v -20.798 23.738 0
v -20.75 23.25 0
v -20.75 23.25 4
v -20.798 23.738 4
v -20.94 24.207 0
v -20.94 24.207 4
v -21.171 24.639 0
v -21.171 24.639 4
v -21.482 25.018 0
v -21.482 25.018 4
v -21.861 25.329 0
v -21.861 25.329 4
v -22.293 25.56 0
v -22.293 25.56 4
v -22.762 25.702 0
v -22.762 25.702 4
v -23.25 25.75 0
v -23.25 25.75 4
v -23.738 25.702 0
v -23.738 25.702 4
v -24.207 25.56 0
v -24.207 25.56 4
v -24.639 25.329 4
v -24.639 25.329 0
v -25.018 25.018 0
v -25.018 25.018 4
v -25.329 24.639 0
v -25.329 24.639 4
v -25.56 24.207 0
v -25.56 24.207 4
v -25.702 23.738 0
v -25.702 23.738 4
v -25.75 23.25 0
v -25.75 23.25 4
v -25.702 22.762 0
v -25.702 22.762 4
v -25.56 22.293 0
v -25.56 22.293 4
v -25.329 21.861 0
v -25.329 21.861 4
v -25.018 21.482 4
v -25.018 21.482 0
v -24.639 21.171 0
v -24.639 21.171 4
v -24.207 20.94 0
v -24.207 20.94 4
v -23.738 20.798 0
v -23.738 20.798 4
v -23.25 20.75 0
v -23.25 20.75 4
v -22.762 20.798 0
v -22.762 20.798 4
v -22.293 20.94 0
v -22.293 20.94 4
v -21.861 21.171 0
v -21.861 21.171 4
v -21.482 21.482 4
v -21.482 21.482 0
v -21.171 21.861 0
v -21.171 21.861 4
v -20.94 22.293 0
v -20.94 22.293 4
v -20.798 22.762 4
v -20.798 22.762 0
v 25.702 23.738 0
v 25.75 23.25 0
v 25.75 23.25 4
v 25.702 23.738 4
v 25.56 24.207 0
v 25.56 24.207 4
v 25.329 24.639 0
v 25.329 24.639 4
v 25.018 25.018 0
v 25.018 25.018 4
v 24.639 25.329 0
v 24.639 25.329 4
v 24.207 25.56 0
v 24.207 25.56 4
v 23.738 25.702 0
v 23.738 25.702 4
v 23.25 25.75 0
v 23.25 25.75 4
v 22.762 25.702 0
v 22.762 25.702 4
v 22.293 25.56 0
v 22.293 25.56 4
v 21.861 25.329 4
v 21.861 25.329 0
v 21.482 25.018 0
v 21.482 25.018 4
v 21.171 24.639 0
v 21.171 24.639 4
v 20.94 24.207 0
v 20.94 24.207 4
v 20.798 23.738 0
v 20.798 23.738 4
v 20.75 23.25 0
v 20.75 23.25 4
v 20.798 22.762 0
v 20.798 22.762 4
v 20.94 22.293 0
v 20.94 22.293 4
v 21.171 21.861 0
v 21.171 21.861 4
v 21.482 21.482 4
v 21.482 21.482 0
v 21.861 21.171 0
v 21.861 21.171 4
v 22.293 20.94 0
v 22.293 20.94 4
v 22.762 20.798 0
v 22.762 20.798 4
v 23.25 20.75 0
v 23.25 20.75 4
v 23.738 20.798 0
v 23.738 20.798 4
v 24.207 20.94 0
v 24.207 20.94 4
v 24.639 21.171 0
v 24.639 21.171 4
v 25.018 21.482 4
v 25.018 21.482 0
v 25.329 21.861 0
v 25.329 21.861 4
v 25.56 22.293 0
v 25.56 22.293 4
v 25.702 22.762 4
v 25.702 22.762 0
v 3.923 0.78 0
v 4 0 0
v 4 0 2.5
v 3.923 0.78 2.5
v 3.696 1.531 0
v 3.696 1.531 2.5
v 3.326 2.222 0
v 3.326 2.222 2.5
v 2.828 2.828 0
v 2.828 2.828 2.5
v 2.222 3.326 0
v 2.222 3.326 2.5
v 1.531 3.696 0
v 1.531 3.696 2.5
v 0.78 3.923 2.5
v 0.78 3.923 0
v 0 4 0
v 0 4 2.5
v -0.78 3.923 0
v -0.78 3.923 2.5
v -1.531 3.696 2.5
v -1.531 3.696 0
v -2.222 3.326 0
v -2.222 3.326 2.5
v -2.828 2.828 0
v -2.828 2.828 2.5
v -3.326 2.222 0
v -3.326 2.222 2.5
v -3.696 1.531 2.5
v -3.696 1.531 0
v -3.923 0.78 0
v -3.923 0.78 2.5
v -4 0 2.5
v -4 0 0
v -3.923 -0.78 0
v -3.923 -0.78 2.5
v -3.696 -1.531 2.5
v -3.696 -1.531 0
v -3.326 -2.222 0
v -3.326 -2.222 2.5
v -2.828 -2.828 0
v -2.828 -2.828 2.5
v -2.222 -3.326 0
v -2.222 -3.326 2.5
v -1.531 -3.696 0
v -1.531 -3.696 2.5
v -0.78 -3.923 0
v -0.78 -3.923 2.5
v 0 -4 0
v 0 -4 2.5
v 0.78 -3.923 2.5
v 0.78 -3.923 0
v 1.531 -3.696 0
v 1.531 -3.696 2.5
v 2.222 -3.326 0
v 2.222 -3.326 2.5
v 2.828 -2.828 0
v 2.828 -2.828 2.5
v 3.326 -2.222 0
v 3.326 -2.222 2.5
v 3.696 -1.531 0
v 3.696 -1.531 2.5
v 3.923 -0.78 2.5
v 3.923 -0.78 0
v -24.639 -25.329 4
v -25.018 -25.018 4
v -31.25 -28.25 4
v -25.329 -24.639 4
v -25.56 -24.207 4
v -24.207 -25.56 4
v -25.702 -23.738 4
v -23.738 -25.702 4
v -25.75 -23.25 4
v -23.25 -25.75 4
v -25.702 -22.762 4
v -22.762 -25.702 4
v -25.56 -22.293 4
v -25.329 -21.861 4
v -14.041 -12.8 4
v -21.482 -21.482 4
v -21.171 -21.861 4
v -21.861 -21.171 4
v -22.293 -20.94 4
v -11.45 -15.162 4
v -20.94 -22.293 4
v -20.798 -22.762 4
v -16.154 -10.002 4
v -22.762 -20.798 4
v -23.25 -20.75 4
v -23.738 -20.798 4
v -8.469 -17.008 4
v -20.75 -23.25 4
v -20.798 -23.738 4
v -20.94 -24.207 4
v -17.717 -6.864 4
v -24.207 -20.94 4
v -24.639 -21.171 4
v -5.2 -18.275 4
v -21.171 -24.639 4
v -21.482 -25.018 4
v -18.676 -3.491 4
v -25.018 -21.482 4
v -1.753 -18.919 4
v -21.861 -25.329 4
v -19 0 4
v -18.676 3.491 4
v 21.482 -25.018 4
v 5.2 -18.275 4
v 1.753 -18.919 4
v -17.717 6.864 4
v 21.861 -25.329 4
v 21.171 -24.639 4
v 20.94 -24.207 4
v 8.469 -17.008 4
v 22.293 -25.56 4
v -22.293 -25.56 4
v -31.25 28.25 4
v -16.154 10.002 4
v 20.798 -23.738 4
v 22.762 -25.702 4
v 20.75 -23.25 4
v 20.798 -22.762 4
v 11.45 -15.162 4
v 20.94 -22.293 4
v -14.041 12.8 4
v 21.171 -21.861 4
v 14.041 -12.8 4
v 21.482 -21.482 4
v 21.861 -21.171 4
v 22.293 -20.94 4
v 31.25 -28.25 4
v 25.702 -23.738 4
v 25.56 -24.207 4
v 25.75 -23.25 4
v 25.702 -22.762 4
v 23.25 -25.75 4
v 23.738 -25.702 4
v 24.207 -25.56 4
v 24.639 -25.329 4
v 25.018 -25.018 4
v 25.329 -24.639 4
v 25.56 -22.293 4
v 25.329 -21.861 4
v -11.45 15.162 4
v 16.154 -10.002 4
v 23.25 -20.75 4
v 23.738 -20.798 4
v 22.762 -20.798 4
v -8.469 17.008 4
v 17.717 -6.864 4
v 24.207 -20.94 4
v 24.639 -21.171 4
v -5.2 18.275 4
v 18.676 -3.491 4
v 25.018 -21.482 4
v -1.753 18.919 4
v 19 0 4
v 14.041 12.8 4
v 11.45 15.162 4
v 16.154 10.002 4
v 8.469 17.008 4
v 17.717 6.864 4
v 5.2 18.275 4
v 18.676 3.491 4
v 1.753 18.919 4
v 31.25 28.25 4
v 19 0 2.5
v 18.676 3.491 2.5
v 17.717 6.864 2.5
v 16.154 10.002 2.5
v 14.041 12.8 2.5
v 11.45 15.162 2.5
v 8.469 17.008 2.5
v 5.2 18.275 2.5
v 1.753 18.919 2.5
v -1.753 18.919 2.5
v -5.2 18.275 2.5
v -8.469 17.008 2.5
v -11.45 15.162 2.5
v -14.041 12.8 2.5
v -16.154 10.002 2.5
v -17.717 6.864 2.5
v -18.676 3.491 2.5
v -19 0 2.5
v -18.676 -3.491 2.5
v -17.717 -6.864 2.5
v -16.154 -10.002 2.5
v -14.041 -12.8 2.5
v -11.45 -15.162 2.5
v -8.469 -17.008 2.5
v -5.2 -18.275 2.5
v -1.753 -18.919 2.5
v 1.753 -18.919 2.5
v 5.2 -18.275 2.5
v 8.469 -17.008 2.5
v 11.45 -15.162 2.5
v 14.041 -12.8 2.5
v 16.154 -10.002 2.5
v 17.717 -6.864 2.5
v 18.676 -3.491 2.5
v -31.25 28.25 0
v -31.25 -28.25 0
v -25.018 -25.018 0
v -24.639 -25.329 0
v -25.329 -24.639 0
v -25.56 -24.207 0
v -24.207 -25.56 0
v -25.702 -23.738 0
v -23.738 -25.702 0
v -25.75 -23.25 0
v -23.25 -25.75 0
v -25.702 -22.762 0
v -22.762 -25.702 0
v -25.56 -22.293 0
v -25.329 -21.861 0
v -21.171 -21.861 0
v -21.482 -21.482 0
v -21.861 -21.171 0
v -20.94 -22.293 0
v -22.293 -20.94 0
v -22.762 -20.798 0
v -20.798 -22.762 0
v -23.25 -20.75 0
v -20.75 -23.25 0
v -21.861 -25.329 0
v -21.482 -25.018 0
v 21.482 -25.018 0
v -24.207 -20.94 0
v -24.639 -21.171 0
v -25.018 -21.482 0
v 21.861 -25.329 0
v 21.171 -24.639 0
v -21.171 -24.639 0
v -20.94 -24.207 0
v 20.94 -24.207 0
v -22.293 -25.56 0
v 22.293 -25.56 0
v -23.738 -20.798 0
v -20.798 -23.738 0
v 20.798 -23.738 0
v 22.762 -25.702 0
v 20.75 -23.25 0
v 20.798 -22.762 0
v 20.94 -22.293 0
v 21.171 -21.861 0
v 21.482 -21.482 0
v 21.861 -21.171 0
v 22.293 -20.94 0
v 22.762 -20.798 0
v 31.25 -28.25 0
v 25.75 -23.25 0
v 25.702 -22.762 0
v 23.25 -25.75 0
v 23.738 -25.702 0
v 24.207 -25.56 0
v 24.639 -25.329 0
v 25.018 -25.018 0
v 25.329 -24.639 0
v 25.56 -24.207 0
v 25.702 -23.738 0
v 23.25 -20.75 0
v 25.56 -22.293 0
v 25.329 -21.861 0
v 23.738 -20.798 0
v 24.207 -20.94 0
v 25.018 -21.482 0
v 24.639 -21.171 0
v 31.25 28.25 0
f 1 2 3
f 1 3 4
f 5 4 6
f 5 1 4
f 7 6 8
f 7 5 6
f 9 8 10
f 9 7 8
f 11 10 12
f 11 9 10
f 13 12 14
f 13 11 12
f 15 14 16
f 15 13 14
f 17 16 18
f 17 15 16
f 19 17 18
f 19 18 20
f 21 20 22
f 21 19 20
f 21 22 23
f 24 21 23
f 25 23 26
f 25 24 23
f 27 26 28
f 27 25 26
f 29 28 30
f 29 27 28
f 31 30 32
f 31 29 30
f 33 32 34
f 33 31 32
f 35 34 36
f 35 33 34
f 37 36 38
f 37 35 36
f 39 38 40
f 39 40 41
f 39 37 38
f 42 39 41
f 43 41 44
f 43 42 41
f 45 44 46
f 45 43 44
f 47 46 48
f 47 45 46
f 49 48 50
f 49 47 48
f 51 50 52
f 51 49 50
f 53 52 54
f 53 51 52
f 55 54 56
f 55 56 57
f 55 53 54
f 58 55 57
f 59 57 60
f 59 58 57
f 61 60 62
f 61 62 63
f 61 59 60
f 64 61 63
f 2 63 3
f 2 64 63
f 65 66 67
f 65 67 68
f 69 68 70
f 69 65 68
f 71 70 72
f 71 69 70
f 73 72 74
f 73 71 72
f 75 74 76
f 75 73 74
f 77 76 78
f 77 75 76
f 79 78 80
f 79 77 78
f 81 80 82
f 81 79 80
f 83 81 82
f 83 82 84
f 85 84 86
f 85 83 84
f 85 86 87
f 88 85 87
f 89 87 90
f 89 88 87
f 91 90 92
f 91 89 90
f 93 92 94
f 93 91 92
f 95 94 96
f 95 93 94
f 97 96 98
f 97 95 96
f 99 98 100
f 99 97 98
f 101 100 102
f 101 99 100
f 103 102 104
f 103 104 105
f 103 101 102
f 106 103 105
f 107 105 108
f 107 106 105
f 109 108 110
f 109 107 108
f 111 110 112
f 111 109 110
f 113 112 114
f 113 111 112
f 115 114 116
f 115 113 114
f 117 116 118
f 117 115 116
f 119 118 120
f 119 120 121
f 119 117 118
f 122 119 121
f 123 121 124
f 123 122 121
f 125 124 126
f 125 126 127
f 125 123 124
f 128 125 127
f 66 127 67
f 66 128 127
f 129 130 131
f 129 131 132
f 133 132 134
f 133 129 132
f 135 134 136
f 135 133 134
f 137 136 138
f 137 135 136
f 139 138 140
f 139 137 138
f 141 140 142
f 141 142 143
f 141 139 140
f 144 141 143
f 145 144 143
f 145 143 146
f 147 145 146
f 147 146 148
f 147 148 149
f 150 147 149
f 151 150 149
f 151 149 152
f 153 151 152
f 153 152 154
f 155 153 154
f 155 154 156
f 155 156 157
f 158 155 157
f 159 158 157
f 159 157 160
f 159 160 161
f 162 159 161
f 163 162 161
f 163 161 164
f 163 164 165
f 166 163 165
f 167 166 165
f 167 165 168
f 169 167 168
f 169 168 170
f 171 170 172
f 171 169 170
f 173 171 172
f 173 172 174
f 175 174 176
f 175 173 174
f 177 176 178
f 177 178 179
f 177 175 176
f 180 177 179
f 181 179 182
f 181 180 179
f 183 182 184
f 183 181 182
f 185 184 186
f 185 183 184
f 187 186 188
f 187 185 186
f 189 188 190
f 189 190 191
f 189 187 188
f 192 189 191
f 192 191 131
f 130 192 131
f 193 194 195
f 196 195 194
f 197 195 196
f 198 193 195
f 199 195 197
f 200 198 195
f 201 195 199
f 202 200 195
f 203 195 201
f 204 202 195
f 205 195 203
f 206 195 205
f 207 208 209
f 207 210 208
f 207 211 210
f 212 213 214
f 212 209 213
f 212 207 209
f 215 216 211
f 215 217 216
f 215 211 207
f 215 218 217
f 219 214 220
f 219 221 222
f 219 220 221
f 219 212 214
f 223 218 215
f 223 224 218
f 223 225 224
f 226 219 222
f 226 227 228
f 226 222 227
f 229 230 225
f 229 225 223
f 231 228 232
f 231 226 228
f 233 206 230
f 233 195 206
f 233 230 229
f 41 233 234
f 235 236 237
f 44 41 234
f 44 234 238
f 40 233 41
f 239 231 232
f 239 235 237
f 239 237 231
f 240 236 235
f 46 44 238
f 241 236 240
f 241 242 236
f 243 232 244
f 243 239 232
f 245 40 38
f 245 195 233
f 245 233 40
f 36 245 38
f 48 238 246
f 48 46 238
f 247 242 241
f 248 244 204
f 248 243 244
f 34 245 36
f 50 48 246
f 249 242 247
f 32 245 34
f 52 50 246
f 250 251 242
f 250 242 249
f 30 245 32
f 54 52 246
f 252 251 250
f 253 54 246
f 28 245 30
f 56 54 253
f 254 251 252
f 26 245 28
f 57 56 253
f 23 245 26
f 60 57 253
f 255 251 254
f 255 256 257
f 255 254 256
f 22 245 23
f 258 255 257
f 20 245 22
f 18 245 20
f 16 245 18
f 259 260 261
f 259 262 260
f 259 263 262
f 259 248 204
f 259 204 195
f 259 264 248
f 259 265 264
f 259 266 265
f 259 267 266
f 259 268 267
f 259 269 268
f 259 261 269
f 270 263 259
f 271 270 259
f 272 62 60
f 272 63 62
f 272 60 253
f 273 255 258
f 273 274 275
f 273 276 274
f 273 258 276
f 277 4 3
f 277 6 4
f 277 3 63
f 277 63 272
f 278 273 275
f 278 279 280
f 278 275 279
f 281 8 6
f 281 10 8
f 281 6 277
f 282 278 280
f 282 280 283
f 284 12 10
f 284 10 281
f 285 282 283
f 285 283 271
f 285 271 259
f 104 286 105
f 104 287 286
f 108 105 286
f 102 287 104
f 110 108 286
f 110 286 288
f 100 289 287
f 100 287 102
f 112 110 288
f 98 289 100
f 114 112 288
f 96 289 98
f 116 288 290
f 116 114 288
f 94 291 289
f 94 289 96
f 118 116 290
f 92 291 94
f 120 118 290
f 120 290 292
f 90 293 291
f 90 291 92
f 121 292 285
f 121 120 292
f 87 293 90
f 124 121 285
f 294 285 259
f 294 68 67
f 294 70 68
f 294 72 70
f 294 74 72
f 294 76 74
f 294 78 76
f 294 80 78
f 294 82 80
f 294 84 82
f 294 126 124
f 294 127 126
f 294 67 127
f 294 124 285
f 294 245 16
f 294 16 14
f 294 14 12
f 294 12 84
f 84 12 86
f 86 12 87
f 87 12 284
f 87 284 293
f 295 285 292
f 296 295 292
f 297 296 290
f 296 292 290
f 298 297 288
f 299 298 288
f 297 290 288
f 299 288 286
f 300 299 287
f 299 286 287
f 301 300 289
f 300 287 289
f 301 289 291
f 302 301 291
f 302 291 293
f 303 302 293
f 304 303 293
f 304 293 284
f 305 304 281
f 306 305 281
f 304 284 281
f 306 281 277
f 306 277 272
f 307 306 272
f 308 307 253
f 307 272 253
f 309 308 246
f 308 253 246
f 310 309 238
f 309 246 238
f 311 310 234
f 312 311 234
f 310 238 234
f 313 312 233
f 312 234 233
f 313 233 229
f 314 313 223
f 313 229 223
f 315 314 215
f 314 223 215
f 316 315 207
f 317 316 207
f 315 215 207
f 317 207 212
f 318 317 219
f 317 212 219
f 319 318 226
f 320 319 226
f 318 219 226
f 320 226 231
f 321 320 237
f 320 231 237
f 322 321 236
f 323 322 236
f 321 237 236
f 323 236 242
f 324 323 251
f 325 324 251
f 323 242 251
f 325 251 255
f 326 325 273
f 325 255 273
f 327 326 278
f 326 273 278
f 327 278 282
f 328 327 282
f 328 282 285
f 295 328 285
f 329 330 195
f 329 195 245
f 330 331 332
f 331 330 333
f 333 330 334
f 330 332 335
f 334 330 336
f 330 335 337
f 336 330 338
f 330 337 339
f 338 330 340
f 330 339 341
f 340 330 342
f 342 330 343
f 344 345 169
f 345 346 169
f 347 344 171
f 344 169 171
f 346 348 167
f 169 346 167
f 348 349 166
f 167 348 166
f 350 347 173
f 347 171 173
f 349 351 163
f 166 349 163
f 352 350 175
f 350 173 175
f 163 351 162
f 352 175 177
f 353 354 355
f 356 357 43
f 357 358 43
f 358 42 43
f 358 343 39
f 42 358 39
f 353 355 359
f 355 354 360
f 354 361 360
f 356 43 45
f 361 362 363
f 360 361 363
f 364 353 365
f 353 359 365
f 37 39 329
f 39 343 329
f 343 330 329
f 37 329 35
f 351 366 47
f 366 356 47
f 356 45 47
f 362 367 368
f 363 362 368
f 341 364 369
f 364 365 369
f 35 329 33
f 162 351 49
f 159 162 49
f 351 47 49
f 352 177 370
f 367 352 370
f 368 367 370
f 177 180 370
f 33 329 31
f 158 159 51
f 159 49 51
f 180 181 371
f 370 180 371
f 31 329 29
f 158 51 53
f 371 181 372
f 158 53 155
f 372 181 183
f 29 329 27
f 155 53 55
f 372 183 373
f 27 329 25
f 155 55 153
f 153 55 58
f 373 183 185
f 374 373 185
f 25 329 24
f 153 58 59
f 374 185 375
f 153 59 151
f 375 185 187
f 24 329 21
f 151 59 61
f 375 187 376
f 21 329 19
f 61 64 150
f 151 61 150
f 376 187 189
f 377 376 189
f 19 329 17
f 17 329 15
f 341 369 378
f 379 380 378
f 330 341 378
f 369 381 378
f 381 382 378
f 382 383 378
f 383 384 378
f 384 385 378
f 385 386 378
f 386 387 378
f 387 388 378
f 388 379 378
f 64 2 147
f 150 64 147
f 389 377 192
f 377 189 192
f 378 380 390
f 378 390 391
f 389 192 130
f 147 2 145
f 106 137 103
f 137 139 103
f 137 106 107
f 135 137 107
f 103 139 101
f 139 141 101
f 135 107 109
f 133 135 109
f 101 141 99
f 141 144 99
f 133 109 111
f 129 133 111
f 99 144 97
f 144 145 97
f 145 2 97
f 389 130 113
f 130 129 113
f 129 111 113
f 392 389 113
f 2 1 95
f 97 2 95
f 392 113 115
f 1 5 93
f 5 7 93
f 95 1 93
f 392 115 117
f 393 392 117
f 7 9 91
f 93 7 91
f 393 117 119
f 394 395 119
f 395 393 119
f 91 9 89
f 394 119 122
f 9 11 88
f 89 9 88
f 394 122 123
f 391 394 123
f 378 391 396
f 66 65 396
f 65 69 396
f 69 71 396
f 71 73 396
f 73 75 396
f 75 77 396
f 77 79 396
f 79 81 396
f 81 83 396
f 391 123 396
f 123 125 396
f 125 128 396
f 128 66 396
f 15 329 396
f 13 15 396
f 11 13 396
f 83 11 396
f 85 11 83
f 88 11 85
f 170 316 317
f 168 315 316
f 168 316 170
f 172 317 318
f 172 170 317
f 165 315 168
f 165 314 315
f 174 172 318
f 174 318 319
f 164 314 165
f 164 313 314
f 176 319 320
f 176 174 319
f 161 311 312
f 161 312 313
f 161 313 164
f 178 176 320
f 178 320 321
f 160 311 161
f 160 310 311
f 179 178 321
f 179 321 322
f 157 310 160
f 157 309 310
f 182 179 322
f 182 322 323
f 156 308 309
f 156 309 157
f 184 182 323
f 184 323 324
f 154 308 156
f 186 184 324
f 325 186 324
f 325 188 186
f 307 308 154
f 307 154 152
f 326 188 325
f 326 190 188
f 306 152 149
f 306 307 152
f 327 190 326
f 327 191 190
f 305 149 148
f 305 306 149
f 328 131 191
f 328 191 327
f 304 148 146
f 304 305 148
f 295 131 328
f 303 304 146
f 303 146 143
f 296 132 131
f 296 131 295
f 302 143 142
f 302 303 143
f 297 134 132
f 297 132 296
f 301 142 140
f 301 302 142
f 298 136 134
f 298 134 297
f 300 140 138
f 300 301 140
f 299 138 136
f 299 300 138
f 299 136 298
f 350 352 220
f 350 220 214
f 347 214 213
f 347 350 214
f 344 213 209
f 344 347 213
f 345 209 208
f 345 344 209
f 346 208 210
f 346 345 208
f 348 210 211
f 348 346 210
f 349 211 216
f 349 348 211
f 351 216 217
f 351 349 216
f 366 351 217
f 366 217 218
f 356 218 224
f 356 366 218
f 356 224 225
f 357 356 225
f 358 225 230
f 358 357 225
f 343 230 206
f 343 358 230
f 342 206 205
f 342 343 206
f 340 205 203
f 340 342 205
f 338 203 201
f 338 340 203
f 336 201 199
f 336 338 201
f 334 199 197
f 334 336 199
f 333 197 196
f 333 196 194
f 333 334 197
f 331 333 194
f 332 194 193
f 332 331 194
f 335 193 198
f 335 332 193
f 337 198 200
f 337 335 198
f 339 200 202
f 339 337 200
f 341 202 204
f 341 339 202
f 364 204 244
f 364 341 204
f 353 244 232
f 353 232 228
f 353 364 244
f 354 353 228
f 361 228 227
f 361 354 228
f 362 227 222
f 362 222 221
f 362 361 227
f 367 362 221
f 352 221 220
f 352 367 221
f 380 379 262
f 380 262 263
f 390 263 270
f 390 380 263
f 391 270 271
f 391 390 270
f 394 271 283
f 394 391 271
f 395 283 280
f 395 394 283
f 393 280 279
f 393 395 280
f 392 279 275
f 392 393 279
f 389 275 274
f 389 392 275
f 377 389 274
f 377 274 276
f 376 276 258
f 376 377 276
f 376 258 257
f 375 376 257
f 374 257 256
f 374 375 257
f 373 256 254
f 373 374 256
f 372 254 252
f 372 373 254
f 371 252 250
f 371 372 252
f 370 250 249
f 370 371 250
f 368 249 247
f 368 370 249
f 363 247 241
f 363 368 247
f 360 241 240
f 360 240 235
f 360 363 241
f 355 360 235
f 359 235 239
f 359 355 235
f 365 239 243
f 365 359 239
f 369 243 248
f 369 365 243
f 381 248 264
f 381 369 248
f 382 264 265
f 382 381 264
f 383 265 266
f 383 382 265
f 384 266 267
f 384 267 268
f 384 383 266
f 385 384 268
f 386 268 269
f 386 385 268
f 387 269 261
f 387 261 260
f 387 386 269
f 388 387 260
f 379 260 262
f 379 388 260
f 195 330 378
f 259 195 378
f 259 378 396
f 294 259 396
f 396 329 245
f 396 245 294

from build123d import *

# Parameters (mm, degrees)
SKETCH_W      = 62.5
SKETCH_H      = 56.5
SKETCH_R      = 2.5
SKETCH_R_2    = 4
PAD_DEPTH     = 4
SKETCH001_R   = 19
SKETCH001_R_2 = 4
POCKET_DEPTH  = 1.5


with BuildPart() as part:
    # Sketch → Pad (new body)
    with BuildSketch(Plane.XY):
        Rectangle(SKETCH_W, SKETCH_H)
        with Locations((23.25, -23.25)):
            Circle(SKETCH_R, mode=Mode.SUBTRACT)
        with Locations((23.25, 23.25)):
            Circle(SKETCH_R, mode=Mode.SUBTRACT)
        with Locations((-23.25, 23.25)):
            Circle(SKETCH_R, mode=Mode.SUBTRACT)
        with Locations((-23.25, -23.25)):
            Circle(SKETCH_R, mode=Mode.SUBTRACT)
        Circle(SKETCH_R_2, mode=Mode.SUBTRACT)
    extrude(amount=PAD_DEPTH)

    # Sketch001 (on Face11 of Pad) → Pocket (cut)
    with BuildSketch(Plane.XY.offset(4)):
        Circle(SKETCH001_R)
        Circle(SKETCH001_R_2, mode=Mode.SUBTRACT)
    extrude(amount=-POCKET_DEPTH, mode=Mode.SUBTRACT)


solid = part.part
